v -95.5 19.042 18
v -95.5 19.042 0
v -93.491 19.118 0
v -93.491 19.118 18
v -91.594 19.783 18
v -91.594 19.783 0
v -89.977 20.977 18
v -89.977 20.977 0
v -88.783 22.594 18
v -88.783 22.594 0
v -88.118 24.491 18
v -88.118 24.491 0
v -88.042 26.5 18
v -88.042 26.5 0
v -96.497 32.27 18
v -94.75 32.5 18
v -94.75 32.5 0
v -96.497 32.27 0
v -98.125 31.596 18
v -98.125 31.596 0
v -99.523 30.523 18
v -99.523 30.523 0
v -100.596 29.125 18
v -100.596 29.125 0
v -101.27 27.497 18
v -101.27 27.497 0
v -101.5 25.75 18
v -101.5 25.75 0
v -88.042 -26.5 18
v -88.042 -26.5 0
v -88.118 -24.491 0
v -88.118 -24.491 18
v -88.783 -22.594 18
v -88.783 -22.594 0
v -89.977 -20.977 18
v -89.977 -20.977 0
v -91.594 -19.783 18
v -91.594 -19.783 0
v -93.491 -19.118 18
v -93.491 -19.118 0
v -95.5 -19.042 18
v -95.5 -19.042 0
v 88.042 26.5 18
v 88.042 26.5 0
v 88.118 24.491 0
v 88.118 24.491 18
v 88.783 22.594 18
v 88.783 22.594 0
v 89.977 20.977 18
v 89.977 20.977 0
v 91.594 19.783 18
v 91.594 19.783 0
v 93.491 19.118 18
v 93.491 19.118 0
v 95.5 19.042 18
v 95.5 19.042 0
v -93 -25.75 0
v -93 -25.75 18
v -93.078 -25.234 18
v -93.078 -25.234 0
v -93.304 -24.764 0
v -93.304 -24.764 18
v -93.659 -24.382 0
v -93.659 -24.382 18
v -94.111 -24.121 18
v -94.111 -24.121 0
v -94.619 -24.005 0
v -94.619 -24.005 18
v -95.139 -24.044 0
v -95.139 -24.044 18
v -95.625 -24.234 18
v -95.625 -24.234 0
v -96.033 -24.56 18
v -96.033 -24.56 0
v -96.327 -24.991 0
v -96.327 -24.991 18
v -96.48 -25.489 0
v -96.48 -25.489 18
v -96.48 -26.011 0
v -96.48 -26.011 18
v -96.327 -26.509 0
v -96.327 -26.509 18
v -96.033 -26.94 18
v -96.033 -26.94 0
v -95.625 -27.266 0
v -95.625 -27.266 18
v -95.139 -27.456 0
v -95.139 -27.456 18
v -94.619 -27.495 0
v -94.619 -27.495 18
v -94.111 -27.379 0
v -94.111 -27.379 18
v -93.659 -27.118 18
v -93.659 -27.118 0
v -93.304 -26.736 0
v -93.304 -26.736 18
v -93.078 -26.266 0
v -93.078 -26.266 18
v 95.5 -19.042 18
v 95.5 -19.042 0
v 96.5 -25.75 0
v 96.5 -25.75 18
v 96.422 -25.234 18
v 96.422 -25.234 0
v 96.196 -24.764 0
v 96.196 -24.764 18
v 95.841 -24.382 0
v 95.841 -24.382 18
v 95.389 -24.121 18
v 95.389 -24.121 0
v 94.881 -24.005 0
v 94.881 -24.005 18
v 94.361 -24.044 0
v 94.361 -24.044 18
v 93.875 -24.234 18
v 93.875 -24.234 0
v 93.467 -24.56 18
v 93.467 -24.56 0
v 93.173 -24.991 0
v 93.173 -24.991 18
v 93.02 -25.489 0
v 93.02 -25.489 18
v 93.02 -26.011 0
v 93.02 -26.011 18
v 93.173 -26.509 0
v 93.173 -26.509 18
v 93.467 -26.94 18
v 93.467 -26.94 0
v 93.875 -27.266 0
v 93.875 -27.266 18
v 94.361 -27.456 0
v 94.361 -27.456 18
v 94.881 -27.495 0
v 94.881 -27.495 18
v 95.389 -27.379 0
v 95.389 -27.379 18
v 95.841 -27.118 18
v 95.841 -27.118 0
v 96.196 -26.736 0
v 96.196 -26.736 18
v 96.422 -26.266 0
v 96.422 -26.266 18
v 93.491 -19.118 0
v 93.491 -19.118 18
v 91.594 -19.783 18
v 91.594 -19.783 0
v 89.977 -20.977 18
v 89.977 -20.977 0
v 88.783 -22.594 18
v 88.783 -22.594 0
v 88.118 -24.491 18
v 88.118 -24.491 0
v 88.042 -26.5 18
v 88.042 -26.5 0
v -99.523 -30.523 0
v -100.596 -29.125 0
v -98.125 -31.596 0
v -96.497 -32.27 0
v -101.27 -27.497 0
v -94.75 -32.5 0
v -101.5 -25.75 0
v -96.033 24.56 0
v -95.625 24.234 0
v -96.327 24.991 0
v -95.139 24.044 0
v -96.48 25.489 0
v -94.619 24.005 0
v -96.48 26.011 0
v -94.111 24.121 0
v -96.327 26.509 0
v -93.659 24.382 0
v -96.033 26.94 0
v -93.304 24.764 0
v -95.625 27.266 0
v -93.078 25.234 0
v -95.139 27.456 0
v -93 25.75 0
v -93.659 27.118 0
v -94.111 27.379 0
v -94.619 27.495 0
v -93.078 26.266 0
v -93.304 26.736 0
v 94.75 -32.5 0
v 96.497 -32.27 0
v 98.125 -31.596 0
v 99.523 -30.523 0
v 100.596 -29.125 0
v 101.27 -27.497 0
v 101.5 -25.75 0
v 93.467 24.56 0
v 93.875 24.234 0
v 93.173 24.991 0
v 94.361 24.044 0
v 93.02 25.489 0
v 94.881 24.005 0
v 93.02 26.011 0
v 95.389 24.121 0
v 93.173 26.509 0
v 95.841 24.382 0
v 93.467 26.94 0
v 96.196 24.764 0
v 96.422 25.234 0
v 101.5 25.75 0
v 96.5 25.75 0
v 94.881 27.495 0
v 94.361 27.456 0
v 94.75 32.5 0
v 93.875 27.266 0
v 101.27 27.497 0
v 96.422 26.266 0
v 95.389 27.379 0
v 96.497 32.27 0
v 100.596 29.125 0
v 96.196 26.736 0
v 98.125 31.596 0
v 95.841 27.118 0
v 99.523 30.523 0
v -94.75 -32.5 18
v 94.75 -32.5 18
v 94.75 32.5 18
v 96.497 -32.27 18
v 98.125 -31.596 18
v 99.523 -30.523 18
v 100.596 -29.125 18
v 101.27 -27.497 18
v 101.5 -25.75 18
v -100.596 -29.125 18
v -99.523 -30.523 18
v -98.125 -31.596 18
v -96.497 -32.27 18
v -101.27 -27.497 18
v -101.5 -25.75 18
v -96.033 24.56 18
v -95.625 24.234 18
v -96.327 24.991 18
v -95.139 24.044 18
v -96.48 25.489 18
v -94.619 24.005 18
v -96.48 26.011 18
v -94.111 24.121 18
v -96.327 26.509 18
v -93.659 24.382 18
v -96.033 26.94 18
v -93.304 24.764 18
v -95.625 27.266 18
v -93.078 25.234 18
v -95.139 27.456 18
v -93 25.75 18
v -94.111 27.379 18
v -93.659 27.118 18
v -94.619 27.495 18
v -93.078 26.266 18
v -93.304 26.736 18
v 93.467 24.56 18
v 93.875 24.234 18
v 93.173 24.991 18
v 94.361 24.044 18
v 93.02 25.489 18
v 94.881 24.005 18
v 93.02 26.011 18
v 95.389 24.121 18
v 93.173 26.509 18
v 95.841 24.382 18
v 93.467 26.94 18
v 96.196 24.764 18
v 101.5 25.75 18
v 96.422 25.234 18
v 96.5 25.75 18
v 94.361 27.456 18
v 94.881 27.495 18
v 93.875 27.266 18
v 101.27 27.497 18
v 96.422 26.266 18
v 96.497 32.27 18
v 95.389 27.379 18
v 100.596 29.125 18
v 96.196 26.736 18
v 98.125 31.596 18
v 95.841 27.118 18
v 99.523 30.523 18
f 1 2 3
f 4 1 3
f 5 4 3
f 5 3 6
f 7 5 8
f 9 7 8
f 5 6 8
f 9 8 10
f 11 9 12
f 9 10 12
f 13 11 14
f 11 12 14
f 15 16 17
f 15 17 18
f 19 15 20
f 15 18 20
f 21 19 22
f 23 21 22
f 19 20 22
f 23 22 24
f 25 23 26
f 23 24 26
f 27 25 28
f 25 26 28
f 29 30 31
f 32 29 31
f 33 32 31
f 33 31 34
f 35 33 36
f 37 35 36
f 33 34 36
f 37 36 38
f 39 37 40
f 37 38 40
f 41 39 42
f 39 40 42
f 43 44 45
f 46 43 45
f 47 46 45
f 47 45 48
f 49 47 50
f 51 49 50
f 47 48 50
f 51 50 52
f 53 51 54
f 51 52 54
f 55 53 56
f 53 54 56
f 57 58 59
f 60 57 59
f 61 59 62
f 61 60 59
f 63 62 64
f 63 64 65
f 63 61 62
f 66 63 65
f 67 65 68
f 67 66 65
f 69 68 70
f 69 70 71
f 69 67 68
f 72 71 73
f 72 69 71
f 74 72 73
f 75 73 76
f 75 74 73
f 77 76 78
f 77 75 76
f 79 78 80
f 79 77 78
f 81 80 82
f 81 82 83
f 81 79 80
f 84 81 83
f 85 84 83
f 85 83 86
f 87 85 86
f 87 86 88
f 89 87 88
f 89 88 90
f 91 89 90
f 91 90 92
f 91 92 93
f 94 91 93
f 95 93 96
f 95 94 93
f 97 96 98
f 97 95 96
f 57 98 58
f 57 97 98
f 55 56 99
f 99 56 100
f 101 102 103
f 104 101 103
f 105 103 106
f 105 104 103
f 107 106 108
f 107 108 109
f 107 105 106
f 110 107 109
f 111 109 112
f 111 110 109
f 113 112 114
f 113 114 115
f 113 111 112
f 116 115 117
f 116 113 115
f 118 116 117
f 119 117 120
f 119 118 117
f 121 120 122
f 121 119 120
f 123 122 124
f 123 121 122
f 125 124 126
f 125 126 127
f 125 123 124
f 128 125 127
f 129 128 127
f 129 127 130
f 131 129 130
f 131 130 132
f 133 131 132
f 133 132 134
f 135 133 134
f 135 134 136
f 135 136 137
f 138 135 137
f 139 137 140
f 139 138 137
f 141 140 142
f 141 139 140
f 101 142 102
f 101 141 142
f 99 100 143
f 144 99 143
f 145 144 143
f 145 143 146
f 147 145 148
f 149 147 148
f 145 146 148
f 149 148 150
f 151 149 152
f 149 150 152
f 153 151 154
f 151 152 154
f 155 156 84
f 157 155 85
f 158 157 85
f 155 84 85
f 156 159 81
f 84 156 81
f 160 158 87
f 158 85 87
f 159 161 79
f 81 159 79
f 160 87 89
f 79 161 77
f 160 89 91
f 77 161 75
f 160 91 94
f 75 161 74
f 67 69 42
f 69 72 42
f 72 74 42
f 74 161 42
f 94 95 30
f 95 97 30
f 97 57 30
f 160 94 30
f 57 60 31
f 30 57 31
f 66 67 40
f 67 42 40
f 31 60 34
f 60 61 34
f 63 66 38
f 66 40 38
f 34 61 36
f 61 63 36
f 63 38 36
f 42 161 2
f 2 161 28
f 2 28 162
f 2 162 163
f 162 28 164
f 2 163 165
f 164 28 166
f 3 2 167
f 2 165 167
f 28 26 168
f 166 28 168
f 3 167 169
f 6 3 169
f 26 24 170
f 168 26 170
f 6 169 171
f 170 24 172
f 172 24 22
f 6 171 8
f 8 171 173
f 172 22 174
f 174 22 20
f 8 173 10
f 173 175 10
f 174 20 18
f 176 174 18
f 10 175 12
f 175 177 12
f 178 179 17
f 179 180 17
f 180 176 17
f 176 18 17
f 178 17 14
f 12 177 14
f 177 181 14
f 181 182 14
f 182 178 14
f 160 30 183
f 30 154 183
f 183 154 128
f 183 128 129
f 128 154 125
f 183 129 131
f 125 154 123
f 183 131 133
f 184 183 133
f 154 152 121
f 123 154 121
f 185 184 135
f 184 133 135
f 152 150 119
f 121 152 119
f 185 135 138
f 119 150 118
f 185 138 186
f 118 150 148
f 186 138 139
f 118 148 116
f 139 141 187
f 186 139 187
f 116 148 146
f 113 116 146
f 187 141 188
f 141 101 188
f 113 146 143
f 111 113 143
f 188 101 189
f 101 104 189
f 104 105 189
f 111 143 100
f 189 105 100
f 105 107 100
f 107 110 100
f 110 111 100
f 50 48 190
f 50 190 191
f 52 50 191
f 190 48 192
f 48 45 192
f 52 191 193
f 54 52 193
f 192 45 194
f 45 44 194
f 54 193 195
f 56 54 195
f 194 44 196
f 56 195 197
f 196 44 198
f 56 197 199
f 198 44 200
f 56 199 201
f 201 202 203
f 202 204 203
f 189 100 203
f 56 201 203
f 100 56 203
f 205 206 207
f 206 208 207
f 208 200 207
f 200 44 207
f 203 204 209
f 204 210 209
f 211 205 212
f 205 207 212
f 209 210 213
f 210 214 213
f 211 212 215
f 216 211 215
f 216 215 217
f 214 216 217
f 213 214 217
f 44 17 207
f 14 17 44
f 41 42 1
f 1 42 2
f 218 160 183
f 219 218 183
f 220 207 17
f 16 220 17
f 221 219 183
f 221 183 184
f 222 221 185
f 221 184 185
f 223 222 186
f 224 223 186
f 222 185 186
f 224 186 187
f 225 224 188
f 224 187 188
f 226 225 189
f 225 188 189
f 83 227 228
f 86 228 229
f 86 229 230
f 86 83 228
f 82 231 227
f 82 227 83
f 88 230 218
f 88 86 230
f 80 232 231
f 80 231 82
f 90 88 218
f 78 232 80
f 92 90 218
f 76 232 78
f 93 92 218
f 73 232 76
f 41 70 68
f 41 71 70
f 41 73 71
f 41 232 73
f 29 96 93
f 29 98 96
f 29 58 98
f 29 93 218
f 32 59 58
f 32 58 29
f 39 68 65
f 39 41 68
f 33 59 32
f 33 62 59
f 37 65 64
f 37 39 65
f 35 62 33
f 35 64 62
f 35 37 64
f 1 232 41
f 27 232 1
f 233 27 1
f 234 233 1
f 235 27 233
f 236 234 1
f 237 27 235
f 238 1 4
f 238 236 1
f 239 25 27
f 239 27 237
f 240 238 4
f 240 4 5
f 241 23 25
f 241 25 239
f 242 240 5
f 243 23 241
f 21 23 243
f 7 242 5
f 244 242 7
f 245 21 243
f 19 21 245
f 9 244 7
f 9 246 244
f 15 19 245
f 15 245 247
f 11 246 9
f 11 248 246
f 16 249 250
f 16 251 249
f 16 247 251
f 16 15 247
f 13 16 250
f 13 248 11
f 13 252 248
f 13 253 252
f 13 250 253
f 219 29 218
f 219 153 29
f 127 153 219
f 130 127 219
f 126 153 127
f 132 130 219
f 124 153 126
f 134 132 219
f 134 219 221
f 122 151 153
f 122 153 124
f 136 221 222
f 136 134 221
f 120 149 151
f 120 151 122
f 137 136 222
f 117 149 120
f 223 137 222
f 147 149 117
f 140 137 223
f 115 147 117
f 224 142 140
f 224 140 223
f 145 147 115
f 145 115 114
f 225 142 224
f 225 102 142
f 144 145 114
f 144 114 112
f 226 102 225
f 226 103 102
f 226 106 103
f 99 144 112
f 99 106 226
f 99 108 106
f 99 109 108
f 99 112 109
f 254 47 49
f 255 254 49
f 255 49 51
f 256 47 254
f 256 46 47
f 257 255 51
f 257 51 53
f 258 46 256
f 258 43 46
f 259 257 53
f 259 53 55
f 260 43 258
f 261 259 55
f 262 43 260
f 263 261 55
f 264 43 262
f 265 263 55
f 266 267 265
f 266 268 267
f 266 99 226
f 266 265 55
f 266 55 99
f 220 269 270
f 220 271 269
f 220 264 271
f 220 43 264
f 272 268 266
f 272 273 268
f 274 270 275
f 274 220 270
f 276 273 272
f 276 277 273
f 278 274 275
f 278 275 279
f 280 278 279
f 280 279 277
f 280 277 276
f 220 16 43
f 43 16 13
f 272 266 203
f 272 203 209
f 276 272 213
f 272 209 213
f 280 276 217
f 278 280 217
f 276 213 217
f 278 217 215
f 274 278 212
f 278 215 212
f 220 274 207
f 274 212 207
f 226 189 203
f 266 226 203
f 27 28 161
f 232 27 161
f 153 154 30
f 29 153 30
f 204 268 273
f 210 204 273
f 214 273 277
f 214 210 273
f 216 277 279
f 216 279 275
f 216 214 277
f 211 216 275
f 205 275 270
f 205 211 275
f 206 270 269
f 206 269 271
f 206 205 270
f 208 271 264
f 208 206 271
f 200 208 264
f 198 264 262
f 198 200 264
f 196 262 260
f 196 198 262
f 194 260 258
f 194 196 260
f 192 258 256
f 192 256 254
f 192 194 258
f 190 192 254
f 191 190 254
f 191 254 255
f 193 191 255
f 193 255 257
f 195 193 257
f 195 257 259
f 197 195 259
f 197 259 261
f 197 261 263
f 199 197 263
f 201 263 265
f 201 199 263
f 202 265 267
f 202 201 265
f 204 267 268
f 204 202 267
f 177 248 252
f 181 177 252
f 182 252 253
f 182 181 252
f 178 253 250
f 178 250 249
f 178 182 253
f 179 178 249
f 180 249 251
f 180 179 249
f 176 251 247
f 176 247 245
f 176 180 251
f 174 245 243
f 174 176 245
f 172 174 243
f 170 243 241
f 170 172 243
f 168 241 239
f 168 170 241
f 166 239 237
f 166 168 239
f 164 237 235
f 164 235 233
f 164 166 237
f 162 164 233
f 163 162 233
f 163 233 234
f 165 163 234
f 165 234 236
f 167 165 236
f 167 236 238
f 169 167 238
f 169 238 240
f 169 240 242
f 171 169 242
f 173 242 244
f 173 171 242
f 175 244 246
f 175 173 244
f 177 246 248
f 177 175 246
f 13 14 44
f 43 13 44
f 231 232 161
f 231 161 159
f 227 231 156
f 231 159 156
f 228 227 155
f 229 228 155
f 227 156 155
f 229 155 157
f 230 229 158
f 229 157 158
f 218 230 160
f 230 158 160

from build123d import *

# Parameters (mm, degrees)
F0_R     = 1.75
F1_DEPTH = 18


with BuildPart() as f1:
    # F0 (on Top) → F1 (new body)
    with BuildSketch(Plane.XY):
        with BuildLine():
            Line((-94.75, -32.5), (94.75, -32.5))
            ThreePointArc((94.75, -32.5), (99.522971, -30.522971), (101.5, -25.75))
            Line((101.5, -25.75), (101.5, 25.75))
            ThreePointArc((101.5, 25.75), (99.522971, 30.522971), (94.75, 32.5))
            Line((94.75, 32.5), (-94.75, 32.5))
            ThreePointArc((-94.75, 32.5), (-99.522971, 30.522971), (-101.5, 25.75))
            Line((-101.5, 25.75), (-101.5, -25.75))
            ThreePointArc((-101.5, -25.75), (-99.522971, -30.522971), (-94.75, -32.5))
        make_face()
        with Locations((-94.75, -25.75)):
            Circle(F0_R, mode=Mode.SUBTRACT)
        with Locations((94.75, -25.75)):
            Circle(F0_R, mode=Mode.SUBTRACT)
        with Locations((-94.75, 25.75)):
            Circle(F0_R, mode=Mode.SUBTRACT)
        with BuildLine():
            Line((6.708204, 26.5), (88.041796, 26.5))
            ThreePointArc((88.041796, 26.5), (89.977029, 20.977029), (95.5, 19.041796))
            Line((95.5, 19.041796), (95.5, -19.041796))
            ThreePointArc((95.5, -19.041796), (89.977029, -20.977029), (88.041796, -26.5))
            Line((88.041796, -26.5), (6.708204, -26.5))
            Line((6.708204, -26.5), (-88.041796, -26.5))
            ThreePointArc((-88.041796, -26.5), (-89.977029, -20.977029), (-95.5, -19.041796))
            Line((-95.5, -19.041796), (-95.5, 19.041796))
            ThreePointArc((-95.5, 19.041796), (-89.977029, 20.977029), (-88.041796, 26.5))
            Line((-88.041796, 26.5), (6.708204, 26.5))
        make_face(mode=Mode.SUBTRACT)
        with Locations((94.75, 25.75)):
            Circle(F0_R, mode=Mode.SUBTRACT)
    extrude(amount=F1_DEPTH)


solid = f1.part
